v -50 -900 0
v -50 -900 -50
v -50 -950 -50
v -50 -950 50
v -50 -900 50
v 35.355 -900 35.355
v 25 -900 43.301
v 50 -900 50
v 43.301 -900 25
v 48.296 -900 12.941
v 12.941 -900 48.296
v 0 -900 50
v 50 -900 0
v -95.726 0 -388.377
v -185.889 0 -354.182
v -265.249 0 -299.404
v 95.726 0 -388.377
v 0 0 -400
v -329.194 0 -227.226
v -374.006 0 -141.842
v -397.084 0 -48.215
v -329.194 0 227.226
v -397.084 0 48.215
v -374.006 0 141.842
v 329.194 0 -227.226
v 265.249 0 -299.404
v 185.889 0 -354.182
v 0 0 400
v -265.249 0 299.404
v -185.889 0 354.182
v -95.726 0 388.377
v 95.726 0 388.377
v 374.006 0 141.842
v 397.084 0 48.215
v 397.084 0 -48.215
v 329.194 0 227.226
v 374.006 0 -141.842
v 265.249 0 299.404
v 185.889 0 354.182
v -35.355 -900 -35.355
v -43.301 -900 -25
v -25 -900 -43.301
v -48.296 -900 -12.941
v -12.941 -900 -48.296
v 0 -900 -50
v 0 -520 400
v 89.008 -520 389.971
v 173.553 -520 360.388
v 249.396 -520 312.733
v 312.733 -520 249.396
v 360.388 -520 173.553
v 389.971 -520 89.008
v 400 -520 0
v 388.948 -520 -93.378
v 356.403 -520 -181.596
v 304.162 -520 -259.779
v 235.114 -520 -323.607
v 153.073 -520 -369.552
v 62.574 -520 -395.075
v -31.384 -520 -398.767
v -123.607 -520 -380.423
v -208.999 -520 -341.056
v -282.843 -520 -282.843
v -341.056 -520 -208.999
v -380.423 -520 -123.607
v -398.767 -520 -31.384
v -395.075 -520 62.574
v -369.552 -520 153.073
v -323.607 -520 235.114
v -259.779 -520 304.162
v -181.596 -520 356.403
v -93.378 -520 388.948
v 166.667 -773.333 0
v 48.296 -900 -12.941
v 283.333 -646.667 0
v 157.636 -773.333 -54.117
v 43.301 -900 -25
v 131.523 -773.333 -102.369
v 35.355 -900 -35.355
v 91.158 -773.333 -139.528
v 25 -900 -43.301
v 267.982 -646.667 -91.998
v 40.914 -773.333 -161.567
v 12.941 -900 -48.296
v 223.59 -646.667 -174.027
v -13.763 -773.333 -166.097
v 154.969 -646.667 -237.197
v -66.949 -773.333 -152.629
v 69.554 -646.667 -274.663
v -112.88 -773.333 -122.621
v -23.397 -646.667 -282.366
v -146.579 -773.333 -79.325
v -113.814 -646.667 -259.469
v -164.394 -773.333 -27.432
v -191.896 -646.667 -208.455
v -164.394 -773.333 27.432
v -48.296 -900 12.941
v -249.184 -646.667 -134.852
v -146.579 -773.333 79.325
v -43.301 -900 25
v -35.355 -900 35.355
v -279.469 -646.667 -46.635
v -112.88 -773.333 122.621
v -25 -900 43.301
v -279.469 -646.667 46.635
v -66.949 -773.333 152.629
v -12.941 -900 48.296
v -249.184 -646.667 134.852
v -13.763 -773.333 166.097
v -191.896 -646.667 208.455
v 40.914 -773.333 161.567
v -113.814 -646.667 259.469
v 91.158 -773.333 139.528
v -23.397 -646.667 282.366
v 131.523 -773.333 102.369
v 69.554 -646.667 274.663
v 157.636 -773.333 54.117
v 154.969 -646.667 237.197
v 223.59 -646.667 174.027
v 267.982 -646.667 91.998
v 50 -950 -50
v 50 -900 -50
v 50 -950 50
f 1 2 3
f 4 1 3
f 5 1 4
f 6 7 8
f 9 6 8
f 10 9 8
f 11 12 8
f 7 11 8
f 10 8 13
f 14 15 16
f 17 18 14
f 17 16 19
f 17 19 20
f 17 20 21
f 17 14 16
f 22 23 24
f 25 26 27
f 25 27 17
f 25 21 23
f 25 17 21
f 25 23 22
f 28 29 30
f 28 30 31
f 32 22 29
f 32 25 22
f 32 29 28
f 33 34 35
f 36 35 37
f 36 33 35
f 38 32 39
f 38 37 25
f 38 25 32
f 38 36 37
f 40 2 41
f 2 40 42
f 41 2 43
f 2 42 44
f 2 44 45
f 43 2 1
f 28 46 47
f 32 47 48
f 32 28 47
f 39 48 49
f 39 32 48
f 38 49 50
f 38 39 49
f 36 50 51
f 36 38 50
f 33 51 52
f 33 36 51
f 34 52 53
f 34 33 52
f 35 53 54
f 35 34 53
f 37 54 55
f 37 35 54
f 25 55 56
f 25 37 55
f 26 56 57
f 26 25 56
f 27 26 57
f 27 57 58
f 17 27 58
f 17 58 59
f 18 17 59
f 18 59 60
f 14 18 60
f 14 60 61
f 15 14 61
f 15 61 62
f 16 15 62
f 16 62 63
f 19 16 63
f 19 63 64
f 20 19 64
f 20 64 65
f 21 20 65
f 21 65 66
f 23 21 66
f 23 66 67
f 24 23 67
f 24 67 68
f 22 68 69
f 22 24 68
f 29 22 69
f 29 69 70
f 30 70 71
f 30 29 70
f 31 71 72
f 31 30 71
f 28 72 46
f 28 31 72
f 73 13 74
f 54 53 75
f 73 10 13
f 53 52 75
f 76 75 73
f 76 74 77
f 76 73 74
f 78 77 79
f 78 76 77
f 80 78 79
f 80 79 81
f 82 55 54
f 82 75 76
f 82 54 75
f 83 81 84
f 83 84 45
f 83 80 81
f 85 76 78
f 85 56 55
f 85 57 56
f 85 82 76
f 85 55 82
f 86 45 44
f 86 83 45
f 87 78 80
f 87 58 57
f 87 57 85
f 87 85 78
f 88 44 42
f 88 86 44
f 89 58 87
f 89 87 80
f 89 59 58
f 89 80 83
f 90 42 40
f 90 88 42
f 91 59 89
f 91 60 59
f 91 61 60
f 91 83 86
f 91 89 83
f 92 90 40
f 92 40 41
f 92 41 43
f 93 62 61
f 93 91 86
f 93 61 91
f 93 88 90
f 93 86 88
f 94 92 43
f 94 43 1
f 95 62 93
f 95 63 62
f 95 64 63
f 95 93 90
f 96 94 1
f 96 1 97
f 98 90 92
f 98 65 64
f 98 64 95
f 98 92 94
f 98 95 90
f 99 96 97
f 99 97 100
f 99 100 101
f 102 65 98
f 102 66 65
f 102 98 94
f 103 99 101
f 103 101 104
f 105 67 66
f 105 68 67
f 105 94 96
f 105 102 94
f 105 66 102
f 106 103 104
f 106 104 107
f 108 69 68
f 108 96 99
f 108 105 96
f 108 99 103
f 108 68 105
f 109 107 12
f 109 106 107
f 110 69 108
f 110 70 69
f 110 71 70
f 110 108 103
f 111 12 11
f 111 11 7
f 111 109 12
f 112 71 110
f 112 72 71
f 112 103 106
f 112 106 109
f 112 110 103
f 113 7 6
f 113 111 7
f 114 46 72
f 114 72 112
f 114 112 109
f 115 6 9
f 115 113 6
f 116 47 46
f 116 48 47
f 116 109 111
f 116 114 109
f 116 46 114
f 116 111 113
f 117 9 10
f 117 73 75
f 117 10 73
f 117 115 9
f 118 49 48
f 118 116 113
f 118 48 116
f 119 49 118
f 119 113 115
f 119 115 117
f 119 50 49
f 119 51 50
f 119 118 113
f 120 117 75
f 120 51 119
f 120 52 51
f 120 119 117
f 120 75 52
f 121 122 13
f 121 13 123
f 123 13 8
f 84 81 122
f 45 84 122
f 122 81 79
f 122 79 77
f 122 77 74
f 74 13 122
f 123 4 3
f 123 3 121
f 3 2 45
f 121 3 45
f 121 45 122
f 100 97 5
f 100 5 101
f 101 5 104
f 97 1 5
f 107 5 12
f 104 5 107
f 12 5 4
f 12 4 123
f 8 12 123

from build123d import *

# Parameters (mm, degrees)
CROQUIS1_R              = 400
SALIENTE_EXTRUIR1_DEPTH = 520
CROQUIS3_R              = 50
CROQUIS2_R              = 400
CROQUIS4_W              = 100
CROQUIS4_H              = 100
SALIENTE_EXTRUIR2_DEPTH = 50


with BuildPart() as part:
    # Croquis1 → Saliente-Extruir1 (new body)
    with BuildSketch(Plane(origin=(0, 0, 0), x_dir=(1, 0, 0), z_dir=(0, 1, 0))):
        with Locations(Location((0, 0, 0), (0, 0, 270))):
            Circle(CROQUIS1_R)
    extrude(amount=-SALIENTE_EXTRUIR1_DEPTH)

    # Croquis3 → Recubrir1 section 0
    with BuildSketch(Plane(origin=(0, -900, 0), x_dir=(1, 0, 0), z_dir=(0, 1, 0))):
        Circle(CROQUIS3_R)
    # Croquis2 → Recubrir1 section 1
    with BuildSketch(Plane.XZ.offset(520)):
        Circle(CROQUIS2_R)
    loft()

    # Croquis4 → Saliente-Extruir2 (add)
    with BuildSketch(Plane.XZ.offset(900)):
        Rectangle(CROQUIS4_W, CROQUIS4_H)
    extrude(amount=SALIENTE_EXTRUIR2_DEPTH)


solid = part.part
